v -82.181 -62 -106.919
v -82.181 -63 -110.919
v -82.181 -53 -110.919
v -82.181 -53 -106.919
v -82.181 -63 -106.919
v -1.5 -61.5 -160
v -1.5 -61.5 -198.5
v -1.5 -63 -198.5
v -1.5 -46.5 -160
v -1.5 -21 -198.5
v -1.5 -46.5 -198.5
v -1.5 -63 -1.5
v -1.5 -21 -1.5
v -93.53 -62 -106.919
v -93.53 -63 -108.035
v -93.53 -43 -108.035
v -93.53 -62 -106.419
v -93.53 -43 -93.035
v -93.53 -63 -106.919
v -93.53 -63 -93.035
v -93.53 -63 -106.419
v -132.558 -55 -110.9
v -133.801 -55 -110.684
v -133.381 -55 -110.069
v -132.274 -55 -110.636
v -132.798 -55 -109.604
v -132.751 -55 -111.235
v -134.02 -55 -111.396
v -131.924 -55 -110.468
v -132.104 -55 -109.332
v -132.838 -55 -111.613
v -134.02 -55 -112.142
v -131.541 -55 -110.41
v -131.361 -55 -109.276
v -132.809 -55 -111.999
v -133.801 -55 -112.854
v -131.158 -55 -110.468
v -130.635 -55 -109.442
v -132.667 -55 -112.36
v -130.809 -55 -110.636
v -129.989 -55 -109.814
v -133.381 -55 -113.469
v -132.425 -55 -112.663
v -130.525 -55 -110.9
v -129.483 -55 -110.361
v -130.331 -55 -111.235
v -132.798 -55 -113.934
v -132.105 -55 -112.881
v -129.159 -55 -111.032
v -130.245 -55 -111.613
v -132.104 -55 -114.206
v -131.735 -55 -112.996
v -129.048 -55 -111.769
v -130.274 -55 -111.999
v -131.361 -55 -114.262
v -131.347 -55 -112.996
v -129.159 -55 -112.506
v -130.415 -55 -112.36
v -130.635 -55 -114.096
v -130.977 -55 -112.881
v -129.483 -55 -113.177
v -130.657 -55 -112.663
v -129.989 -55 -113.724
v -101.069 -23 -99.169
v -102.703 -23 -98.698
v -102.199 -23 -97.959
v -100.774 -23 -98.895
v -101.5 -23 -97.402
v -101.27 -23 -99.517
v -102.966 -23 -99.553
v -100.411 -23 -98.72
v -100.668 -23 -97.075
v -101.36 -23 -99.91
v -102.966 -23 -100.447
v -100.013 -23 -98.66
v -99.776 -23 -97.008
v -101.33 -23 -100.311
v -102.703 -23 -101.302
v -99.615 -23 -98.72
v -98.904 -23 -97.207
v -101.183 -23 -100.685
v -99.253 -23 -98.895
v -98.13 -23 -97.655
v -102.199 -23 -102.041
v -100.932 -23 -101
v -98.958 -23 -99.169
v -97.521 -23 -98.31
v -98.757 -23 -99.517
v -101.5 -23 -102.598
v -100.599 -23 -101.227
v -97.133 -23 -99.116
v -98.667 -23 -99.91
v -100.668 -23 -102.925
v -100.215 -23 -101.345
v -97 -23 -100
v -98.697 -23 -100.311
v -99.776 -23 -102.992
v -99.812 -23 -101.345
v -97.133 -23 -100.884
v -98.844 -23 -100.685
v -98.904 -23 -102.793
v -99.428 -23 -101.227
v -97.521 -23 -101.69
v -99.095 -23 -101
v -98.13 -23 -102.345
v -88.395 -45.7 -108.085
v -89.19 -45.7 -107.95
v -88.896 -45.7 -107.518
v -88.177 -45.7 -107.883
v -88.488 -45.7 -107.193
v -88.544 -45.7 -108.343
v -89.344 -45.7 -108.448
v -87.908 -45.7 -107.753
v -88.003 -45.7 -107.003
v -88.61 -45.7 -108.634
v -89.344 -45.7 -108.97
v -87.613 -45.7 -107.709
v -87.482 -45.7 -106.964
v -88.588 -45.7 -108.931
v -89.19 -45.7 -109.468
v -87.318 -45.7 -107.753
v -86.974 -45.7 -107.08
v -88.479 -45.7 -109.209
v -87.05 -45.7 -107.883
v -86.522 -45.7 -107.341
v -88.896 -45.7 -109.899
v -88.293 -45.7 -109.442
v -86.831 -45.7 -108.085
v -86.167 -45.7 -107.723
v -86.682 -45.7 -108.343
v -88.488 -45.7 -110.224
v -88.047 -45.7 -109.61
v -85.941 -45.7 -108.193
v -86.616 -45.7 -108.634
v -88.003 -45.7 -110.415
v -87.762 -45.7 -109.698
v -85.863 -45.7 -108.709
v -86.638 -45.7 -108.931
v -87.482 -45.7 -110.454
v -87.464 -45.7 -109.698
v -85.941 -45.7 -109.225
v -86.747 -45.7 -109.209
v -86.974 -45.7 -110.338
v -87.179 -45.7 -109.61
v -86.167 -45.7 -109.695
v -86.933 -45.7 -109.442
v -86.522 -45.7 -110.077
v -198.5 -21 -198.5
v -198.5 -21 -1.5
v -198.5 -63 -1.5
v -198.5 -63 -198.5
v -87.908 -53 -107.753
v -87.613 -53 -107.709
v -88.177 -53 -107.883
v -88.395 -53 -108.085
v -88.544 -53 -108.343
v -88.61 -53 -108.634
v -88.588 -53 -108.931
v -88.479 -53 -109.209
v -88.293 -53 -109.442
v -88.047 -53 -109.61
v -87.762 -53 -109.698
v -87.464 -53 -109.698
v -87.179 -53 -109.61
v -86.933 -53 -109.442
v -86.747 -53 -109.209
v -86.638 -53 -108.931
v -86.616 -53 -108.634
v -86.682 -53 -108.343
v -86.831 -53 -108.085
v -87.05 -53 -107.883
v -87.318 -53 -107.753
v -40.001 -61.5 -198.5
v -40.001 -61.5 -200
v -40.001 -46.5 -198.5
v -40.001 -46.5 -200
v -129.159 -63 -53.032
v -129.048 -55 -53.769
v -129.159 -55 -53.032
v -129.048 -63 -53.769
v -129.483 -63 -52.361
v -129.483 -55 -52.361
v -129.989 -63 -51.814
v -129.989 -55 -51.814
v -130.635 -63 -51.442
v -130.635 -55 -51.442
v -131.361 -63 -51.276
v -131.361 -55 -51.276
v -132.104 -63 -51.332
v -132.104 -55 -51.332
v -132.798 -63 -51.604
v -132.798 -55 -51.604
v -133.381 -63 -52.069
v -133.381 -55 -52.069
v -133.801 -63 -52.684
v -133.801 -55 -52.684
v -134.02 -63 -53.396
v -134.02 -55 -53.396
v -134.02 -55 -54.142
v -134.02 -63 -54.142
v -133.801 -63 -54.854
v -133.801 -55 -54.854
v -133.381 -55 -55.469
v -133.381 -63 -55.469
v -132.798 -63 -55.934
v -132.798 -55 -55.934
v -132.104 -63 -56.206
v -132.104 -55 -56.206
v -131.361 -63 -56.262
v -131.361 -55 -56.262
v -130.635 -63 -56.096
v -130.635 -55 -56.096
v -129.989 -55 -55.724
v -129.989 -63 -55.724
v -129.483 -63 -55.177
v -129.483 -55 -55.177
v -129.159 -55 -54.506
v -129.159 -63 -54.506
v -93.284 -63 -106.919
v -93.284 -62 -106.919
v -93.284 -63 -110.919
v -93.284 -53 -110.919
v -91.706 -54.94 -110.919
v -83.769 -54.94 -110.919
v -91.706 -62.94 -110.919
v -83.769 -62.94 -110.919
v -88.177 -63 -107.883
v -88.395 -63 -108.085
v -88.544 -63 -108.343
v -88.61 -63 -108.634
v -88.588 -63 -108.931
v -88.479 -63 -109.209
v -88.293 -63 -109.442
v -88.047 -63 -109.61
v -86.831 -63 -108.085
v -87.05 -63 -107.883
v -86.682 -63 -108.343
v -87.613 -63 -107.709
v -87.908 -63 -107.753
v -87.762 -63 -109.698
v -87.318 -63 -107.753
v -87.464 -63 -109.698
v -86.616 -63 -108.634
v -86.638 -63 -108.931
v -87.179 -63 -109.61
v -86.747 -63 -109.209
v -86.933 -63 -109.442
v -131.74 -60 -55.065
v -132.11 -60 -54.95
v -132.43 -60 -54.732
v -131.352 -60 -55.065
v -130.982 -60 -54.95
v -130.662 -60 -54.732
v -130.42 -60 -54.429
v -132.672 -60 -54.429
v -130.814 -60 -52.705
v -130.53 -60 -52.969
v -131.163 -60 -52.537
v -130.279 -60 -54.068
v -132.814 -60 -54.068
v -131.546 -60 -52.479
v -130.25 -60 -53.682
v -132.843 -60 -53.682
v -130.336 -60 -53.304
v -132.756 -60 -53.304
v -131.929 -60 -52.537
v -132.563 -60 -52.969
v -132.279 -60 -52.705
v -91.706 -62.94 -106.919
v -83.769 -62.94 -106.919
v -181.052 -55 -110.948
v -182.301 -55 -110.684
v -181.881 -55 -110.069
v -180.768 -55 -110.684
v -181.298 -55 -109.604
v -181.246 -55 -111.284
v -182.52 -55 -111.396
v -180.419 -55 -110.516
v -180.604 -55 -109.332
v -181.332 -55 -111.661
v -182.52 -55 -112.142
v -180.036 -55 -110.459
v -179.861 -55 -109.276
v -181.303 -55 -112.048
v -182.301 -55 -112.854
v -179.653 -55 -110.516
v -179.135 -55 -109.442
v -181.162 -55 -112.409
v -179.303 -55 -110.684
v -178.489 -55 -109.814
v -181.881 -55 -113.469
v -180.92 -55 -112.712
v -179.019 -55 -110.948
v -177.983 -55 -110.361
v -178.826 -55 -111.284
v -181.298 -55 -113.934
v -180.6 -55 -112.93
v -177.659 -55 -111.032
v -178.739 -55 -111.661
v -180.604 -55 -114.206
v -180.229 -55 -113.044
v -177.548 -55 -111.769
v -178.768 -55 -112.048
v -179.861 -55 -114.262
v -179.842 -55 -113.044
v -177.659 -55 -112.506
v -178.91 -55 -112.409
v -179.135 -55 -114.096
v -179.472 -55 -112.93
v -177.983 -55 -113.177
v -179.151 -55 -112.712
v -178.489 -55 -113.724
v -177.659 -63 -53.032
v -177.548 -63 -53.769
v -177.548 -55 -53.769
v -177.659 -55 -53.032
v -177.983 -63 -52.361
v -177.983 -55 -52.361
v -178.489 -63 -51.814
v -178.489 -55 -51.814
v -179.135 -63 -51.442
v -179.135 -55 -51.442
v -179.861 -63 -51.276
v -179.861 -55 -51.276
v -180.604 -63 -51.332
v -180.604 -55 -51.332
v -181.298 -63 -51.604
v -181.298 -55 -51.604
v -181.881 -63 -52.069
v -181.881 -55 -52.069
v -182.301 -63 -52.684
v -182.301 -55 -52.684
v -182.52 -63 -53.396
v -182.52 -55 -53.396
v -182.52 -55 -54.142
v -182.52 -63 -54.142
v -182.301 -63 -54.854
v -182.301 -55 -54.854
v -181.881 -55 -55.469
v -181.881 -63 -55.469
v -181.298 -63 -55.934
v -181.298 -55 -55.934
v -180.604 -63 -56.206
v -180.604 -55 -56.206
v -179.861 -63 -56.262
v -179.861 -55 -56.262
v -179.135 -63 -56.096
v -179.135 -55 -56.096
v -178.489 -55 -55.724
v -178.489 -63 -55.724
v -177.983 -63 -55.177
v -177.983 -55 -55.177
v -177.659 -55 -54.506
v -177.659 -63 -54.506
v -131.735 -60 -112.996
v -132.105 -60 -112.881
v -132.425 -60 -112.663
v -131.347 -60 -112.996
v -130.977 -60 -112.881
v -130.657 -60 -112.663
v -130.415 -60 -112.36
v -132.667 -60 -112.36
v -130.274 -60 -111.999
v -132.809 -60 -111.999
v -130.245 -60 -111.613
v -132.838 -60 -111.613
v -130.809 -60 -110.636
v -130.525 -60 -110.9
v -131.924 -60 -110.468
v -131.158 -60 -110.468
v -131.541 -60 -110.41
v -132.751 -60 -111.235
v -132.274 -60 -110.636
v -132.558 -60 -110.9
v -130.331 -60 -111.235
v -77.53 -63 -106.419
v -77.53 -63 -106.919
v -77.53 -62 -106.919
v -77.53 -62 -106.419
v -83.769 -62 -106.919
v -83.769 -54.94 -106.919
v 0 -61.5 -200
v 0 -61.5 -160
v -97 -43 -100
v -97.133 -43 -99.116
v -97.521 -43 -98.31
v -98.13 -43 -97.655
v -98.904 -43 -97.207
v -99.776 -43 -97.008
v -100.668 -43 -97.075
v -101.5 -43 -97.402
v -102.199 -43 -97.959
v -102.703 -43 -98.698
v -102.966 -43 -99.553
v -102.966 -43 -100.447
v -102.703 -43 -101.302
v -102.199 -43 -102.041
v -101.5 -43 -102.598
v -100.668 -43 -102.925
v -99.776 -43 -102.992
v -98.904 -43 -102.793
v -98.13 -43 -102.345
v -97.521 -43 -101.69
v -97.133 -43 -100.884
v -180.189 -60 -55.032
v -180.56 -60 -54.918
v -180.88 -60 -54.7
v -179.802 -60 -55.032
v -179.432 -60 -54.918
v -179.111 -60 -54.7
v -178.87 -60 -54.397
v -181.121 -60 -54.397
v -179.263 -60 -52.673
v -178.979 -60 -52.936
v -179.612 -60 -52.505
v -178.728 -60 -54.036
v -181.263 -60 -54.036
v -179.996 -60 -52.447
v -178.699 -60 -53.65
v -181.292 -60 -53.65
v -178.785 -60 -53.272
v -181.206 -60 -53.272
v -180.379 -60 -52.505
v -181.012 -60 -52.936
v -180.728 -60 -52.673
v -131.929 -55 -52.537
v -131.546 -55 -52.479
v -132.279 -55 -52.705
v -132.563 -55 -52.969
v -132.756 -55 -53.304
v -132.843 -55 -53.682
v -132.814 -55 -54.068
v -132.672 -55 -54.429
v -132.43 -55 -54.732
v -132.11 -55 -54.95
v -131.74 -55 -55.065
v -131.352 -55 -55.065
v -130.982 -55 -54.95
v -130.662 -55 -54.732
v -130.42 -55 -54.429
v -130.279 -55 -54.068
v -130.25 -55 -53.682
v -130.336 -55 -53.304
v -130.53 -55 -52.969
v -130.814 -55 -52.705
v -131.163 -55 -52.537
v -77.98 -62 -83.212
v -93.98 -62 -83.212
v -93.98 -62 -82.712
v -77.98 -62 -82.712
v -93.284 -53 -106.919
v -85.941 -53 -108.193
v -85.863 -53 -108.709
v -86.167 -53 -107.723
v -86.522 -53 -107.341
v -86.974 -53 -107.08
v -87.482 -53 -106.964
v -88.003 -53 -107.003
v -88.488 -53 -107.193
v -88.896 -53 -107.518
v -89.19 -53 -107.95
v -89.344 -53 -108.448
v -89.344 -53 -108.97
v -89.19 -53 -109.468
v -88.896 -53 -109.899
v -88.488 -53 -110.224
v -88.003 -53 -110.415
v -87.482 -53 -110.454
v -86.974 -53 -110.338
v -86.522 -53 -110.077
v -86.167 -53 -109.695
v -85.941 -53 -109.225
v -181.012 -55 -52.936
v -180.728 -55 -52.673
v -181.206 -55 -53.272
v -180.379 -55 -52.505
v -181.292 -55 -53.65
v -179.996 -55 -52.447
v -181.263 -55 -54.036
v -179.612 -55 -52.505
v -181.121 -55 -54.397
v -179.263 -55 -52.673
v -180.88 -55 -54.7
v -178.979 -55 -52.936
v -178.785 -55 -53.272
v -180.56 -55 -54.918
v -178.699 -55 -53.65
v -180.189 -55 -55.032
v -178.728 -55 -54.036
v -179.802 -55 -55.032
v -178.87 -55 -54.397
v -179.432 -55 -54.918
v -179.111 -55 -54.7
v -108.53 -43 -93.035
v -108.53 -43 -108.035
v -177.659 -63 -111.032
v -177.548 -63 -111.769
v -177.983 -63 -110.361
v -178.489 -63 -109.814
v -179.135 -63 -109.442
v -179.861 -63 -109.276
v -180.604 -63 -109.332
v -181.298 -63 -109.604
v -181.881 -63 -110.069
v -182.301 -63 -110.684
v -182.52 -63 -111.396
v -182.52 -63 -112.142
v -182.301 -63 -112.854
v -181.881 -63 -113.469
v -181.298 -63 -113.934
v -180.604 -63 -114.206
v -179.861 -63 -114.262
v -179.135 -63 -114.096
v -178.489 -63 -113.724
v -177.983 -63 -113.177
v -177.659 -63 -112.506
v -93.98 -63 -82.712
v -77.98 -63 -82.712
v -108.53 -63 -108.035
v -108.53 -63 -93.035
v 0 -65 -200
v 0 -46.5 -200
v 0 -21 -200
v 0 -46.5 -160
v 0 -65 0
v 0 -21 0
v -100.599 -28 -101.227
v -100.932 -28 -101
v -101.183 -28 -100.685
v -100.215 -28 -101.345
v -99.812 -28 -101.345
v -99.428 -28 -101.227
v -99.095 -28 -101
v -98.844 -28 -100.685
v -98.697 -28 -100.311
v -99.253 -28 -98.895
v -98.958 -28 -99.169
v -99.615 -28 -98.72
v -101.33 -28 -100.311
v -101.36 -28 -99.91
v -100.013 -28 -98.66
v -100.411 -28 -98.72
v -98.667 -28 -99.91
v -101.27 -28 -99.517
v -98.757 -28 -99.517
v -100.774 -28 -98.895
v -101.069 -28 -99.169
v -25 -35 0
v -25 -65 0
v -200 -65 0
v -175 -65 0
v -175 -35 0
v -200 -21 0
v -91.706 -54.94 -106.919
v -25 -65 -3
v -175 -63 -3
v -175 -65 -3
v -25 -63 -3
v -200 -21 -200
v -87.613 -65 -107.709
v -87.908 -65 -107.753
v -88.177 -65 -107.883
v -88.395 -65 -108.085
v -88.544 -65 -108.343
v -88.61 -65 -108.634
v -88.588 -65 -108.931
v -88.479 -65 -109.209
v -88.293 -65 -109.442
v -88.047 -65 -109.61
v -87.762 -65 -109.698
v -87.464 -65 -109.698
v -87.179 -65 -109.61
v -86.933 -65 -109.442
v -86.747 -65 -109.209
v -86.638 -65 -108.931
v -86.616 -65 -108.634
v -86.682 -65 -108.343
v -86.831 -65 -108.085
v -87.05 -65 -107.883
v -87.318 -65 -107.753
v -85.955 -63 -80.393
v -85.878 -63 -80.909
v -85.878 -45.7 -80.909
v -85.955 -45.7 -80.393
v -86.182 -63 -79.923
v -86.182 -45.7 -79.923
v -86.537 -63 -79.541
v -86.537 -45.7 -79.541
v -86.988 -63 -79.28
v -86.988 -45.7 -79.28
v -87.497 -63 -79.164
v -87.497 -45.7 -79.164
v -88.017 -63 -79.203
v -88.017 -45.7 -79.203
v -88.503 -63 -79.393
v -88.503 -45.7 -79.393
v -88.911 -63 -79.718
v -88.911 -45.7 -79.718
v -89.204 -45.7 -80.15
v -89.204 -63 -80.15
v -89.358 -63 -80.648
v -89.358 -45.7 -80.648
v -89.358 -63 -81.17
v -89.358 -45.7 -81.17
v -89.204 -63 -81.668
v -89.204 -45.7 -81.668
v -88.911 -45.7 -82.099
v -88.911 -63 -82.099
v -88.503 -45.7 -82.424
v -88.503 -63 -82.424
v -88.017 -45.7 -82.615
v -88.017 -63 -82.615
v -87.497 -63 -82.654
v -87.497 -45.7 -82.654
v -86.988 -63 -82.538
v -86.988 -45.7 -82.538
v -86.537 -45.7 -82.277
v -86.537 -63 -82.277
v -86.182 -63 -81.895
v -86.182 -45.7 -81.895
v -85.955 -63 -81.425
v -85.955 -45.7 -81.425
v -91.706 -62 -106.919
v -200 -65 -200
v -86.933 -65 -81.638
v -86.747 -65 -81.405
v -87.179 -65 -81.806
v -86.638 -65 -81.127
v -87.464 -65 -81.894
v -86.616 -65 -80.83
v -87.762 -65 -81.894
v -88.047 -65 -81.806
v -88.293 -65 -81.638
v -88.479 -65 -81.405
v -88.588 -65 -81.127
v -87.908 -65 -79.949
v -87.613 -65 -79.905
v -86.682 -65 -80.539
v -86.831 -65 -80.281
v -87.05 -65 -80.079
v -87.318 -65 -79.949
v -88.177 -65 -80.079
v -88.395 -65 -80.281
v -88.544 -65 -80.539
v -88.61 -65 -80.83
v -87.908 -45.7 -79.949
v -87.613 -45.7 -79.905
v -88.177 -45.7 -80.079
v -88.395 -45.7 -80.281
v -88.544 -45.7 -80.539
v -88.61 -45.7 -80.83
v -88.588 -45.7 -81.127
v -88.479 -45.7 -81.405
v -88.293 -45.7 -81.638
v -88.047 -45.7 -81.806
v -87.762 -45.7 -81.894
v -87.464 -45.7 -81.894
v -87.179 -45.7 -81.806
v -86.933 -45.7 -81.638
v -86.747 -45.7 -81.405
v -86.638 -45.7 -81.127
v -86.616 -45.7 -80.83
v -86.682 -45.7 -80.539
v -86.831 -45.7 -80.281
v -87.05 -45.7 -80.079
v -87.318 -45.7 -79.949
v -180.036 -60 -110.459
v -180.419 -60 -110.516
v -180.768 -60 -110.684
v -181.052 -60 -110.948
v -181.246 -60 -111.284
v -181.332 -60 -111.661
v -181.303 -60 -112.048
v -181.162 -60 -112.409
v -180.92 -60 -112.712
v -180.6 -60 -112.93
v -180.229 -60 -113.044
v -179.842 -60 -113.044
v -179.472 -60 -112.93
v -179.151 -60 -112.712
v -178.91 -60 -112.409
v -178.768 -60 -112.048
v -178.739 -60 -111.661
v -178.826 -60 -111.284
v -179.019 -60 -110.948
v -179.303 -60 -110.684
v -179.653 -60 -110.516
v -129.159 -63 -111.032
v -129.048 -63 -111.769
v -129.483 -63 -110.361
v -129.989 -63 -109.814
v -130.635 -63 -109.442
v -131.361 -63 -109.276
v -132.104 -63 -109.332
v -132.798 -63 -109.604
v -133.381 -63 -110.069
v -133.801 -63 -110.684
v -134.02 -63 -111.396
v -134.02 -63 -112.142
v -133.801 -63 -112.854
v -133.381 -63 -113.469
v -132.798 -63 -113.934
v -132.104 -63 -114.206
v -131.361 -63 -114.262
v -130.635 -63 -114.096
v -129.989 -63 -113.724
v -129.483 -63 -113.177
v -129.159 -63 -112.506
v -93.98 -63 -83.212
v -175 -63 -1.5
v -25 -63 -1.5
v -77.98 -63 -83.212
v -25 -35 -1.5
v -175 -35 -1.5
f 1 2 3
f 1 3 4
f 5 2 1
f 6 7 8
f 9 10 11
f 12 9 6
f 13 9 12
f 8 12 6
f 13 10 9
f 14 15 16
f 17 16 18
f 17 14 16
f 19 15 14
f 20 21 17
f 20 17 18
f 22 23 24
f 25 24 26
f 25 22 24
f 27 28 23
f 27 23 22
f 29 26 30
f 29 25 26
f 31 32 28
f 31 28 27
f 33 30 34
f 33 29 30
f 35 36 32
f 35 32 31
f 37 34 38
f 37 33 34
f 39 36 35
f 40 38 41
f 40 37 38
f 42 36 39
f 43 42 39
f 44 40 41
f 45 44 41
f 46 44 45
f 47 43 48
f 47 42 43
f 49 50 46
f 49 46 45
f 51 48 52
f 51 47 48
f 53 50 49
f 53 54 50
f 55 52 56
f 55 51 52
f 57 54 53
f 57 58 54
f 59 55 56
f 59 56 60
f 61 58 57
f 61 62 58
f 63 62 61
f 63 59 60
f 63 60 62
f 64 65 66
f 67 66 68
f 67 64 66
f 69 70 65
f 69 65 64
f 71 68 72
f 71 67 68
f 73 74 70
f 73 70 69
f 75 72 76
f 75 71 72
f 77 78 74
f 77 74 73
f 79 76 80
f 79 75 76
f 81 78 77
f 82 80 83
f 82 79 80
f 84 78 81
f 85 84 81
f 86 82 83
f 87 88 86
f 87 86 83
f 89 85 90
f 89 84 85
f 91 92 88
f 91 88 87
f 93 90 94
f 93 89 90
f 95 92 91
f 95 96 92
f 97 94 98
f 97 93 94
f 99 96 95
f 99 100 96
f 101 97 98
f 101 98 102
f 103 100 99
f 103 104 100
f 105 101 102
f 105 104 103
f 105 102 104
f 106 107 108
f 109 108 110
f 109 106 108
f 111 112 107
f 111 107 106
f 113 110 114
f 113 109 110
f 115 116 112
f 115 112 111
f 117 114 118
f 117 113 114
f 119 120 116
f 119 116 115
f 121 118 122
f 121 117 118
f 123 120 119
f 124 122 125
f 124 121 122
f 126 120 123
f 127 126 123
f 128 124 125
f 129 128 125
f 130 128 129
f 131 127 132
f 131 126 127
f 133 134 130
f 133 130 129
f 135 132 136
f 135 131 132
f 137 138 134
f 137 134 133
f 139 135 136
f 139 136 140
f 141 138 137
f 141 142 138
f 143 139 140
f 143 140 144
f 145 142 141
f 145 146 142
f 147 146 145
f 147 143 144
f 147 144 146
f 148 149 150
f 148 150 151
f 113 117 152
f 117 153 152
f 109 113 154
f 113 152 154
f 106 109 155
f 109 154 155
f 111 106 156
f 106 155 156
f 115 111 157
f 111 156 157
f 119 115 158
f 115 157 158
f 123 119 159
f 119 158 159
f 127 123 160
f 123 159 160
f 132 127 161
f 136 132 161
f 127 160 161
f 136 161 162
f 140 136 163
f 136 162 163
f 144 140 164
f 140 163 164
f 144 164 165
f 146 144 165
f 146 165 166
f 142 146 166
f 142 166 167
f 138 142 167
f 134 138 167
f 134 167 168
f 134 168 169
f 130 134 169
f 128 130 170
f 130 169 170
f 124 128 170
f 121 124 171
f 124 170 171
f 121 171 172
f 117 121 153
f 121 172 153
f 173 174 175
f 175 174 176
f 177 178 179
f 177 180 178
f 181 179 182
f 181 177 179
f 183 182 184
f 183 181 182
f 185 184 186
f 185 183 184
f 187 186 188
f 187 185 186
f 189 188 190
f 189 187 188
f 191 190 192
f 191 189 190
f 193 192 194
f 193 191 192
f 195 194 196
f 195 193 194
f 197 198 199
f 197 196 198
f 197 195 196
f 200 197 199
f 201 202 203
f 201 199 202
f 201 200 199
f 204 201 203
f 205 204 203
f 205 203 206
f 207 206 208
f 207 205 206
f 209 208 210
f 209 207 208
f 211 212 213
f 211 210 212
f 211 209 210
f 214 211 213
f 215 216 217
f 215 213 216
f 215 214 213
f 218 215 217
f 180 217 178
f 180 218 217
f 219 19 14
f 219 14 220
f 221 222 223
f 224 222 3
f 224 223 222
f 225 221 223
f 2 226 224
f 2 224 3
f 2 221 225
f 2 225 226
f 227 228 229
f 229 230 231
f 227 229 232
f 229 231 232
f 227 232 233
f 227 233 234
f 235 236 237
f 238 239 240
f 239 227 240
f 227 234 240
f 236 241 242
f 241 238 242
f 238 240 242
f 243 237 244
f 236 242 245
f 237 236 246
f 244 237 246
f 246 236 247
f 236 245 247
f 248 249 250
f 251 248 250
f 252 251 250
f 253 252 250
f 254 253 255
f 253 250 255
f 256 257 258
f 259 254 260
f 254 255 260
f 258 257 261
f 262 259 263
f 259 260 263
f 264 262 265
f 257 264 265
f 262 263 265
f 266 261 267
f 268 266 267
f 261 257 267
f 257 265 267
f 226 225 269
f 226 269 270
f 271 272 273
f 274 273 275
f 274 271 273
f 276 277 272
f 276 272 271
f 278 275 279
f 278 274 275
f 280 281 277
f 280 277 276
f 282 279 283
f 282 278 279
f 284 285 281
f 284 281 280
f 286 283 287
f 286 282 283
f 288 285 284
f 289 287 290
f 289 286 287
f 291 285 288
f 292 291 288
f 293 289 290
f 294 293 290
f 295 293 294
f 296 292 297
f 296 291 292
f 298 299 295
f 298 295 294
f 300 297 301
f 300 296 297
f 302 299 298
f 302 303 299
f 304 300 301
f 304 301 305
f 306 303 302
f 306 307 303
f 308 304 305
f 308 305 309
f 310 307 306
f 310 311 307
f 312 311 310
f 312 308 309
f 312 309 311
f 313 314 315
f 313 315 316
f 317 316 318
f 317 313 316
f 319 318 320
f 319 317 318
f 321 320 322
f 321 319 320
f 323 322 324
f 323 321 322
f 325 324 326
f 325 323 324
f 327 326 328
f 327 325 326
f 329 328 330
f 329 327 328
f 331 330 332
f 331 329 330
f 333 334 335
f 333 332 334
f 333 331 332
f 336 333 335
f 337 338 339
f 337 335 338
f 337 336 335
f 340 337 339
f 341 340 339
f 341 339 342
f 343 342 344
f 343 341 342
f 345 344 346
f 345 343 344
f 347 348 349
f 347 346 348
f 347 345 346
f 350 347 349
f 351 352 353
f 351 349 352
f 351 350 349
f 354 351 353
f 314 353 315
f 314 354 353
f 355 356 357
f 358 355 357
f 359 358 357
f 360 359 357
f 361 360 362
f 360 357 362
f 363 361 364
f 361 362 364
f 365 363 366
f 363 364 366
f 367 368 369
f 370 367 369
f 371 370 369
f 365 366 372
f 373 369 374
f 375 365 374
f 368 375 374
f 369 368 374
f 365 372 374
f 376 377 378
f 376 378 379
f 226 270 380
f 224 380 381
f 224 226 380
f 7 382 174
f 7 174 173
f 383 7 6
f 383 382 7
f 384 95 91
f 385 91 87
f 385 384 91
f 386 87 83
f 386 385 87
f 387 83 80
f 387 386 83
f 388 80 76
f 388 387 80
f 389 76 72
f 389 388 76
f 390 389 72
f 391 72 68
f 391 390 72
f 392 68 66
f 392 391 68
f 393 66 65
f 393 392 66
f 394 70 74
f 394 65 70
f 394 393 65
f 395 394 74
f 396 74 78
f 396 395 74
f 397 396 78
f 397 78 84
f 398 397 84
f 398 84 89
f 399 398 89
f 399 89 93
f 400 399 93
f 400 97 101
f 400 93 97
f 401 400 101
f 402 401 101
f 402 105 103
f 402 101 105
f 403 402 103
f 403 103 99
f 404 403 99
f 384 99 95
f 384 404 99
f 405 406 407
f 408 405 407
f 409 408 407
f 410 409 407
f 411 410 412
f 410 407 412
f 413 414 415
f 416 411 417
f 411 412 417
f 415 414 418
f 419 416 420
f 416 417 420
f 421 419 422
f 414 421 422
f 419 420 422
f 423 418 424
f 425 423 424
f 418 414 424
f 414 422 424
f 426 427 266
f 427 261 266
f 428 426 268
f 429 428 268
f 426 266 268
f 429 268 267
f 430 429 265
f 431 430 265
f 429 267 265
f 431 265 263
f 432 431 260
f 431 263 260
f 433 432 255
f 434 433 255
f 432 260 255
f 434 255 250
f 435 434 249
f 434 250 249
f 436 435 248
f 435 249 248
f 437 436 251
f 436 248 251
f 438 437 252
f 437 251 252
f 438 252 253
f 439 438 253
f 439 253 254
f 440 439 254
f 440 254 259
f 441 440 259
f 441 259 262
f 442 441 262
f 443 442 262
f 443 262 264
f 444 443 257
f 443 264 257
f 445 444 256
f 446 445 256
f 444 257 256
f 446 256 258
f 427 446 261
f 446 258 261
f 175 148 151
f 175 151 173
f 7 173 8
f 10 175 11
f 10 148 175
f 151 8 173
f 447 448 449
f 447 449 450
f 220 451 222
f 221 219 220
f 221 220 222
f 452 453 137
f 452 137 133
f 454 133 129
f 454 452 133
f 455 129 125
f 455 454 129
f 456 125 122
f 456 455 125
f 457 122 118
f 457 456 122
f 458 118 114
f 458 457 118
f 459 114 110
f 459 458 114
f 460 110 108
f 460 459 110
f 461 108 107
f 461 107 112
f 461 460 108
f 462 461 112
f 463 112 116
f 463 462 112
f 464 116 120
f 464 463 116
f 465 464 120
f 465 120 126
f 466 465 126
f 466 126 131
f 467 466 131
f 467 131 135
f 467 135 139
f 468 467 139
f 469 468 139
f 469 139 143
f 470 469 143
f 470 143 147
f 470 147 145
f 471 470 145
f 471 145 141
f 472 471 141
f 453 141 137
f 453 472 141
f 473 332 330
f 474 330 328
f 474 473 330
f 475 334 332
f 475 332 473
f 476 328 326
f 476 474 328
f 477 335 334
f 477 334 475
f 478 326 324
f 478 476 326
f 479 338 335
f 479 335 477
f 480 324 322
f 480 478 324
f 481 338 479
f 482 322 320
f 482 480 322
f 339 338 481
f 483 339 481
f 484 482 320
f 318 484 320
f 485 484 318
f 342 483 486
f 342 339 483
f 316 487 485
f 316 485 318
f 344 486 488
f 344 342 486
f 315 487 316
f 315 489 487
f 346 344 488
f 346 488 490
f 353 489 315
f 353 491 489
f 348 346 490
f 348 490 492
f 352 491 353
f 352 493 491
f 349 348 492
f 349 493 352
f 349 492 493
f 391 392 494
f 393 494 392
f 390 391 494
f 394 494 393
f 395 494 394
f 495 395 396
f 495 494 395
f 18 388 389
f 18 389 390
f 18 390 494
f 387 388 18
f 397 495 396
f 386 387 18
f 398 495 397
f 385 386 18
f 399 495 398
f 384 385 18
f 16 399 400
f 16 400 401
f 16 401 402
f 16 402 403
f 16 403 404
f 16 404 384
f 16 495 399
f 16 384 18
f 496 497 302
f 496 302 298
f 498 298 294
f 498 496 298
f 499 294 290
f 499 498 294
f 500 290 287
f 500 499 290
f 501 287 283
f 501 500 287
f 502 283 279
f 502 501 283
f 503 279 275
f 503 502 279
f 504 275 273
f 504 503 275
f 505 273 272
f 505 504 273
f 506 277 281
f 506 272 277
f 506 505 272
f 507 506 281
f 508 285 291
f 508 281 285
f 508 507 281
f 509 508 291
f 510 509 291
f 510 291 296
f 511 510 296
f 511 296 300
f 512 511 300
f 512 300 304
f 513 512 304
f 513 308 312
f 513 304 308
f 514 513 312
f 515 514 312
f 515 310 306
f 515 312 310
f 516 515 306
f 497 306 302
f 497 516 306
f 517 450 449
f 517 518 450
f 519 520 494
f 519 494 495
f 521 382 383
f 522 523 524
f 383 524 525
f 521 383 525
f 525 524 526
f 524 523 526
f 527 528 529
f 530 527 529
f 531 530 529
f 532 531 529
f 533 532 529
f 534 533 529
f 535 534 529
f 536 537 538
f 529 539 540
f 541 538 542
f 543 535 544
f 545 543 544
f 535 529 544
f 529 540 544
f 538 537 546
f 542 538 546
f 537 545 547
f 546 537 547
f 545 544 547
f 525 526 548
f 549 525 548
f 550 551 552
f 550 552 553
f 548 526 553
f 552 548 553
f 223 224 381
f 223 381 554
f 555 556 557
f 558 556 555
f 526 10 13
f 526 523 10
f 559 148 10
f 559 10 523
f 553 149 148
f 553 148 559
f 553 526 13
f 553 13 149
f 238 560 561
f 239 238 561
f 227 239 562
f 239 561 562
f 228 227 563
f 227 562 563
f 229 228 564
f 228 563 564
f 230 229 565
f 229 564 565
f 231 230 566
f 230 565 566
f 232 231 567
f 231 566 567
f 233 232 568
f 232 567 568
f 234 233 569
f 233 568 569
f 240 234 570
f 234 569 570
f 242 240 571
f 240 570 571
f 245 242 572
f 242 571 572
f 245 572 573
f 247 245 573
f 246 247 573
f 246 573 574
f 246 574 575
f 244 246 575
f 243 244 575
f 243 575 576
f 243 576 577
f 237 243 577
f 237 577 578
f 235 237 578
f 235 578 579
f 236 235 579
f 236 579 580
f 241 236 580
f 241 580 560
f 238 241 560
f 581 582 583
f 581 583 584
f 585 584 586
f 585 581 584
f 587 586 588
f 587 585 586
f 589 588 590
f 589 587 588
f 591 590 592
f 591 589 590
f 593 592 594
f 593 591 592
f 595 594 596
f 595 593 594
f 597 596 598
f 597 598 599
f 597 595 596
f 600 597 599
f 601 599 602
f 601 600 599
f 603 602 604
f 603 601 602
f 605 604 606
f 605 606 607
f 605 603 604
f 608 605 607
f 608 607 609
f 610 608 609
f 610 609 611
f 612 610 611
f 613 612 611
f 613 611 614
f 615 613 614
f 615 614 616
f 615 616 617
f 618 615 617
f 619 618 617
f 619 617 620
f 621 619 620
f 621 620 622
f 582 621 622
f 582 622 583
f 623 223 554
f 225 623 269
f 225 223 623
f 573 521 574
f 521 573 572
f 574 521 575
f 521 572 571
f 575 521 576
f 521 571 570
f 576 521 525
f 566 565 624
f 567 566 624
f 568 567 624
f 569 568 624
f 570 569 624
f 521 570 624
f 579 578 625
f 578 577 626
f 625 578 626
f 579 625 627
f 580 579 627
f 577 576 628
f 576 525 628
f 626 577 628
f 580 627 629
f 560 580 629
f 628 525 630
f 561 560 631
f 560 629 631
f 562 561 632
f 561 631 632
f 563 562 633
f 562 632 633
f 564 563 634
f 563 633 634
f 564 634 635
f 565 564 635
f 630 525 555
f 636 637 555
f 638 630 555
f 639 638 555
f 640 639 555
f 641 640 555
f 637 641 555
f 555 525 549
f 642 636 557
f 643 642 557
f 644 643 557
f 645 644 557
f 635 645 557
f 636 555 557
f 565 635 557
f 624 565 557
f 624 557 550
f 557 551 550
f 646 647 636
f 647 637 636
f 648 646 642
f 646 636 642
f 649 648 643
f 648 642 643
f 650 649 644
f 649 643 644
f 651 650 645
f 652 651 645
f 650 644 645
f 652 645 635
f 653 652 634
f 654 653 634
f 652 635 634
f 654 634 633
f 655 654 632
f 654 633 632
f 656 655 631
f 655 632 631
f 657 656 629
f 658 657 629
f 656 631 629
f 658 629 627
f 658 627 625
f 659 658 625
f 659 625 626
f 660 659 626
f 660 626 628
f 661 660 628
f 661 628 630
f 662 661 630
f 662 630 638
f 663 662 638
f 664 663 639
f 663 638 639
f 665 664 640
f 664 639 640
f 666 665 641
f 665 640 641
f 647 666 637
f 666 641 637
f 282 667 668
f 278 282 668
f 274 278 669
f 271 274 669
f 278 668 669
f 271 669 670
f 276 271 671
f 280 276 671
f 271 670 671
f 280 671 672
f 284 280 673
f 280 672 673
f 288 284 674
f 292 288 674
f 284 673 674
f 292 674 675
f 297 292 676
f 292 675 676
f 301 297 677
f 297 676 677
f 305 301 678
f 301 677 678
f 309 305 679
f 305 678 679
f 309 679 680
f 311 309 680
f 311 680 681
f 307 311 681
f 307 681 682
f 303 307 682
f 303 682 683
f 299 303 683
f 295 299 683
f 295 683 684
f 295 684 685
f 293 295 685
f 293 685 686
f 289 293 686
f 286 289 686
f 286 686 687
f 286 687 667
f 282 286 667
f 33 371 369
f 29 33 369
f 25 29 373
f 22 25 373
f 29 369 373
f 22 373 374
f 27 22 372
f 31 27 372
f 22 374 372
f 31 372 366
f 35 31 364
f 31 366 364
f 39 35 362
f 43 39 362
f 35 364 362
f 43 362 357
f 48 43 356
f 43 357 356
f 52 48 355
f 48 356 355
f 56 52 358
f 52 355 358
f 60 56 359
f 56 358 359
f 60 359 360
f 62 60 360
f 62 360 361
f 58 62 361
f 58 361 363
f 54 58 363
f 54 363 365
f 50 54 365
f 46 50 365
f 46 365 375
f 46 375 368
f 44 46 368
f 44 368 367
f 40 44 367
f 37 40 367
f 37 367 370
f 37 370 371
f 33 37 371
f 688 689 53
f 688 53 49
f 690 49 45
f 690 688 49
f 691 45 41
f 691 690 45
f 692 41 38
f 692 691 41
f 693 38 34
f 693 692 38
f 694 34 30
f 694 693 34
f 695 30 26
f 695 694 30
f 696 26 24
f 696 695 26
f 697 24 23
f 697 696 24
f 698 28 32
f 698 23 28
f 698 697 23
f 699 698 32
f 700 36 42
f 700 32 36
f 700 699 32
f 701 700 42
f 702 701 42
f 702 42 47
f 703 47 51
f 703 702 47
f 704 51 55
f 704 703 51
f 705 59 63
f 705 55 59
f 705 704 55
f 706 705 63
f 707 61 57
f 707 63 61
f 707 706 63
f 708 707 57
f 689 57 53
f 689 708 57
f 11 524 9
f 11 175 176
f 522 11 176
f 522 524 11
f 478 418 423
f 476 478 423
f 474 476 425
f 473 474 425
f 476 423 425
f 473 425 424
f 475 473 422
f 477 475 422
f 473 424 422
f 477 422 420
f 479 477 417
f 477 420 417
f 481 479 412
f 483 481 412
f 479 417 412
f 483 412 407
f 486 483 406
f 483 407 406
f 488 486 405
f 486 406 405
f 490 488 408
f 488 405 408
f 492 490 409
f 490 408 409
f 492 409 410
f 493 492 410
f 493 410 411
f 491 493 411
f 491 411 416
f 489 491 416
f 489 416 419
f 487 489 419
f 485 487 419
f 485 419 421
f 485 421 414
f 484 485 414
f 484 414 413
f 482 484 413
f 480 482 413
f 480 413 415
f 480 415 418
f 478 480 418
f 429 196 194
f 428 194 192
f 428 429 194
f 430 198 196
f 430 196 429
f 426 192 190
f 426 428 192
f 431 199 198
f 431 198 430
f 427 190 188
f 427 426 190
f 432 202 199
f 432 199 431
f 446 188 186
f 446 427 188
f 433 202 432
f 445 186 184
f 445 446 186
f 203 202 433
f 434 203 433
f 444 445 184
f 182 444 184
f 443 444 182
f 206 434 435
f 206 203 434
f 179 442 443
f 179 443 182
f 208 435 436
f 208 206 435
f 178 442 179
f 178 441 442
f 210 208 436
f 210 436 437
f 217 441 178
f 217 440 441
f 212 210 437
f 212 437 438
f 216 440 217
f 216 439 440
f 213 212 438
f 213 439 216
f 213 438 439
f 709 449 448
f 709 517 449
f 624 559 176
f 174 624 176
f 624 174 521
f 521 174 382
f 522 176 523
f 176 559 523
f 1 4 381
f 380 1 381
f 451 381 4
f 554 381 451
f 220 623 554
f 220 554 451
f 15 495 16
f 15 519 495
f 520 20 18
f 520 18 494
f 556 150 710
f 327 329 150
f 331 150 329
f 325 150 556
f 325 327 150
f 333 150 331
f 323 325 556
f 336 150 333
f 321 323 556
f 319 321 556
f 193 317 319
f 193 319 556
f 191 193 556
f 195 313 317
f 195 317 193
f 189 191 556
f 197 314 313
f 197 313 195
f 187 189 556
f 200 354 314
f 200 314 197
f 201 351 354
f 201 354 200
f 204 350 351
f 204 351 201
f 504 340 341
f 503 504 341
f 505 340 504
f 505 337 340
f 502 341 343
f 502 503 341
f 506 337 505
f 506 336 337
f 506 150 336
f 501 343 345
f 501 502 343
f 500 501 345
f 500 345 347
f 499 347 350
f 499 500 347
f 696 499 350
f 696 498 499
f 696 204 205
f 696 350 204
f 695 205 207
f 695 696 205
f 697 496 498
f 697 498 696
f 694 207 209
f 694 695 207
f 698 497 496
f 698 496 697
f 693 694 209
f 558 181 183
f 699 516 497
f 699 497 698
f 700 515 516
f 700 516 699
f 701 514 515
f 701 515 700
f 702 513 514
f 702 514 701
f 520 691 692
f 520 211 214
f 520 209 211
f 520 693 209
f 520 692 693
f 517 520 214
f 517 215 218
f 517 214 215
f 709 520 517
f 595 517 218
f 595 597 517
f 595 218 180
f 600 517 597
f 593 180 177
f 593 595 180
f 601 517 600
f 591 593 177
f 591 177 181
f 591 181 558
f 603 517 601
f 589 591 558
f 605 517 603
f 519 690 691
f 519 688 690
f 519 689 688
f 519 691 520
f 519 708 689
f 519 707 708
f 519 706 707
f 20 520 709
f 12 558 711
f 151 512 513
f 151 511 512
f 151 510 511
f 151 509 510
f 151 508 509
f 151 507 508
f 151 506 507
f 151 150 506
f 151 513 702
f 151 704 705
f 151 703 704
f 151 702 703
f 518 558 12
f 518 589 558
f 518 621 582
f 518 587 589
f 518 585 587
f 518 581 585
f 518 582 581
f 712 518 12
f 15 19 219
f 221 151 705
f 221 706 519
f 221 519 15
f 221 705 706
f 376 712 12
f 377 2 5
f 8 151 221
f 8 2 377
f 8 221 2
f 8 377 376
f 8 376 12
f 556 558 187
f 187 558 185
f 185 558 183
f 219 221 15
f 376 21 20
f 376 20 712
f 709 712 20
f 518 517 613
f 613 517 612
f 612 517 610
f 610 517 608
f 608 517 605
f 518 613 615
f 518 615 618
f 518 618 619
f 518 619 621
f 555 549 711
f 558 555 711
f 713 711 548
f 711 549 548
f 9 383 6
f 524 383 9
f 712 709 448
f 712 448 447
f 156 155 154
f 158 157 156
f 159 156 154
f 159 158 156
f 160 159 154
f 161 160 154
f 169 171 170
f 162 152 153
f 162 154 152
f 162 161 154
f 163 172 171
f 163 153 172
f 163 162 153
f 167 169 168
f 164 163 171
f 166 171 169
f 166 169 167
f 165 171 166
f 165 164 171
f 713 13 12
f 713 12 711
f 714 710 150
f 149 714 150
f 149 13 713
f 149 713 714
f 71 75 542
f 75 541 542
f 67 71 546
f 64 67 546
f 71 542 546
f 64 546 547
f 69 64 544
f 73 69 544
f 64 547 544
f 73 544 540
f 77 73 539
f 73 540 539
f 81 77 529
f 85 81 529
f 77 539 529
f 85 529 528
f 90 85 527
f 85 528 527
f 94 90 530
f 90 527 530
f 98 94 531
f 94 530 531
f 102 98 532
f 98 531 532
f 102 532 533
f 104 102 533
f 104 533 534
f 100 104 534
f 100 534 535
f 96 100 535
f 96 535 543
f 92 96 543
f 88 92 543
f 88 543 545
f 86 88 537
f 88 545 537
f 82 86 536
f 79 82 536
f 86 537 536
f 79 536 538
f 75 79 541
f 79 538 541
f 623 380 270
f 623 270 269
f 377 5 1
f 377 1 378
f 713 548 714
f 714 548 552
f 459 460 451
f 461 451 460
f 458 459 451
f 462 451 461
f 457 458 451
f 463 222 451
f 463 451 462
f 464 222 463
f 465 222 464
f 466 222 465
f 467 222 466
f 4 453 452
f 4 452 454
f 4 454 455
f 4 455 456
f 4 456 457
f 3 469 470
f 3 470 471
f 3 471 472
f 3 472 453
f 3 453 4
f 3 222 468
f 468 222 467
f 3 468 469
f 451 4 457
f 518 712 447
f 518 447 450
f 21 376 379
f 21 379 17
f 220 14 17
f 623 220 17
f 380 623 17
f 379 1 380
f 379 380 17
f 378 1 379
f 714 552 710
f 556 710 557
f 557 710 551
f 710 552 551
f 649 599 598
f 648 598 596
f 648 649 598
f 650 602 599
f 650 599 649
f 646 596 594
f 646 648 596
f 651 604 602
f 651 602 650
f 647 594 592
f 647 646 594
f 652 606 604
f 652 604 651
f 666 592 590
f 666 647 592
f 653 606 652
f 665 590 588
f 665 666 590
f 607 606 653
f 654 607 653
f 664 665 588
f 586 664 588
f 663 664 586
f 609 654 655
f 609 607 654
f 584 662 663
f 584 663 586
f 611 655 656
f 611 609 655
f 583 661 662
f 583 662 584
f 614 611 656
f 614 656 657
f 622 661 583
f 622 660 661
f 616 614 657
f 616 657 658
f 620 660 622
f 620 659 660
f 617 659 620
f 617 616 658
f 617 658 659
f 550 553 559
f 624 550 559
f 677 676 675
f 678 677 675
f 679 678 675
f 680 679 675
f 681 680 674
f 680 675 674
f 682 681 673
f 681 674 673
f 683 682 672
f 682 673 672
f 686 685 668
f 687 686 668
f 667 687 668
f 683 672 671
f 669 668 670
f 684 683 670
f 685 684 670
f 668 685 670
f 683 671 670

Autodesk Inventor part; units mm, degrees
ref_plane "YZ Plane" through (0, 0, 0) normal (1, 0, 0) x (0, 1, 0)
ref_plane "XZ Plane" through (0, 0, 0) normal (0, 1, 0) x (-1, 0, 0)
ref_plane "XY Plane" through (0, 0, 0) normal (0, 0, 1) x (1, 0, 0)
sketch "Sketch1" plane through (0, 0, 0) normal (0, 1, 0) x (-1, 0, 0)
  line L0 (0, 0) -> (200, 0)
  line L1 (200, 0) -> (200, -200)
  line L2 (200, -200) -> (0, -200)
  line L3 (0, -200) -> (0, 0)
  line L4 (198, -198) -> (198, -2)
  line L5 (198, -2) -> (2, -2)
  line L6 (2, -2) -> (2, -198)
  line L7 (2, -198) -> (198, -198)
  dimension "d0" = 200
  dimension "d1" = 200
  dimension "d2" = 2
extrude "Extrusion1" add sketch "Sketch1" against normal blind 65 contours L0 L1 L2 L3 | L7 L6 L5 L4
sketch "Sketch2" plane through (0, 0, 0) normal (0, 1, 0) x (1, 0, 0)
  line L0 (-198.5, 198.5) -> (-1.5, 198.5)
  line L1 (-1.5, 198.5) -> (-1.5, 1.5)
  line L2 (-1.5, 1.5) -> (-198.5, 1.5)
  line L3 (-198.5, 1.5) -> (-198.5, 198.5)
  line L4 (-200, 200) -> (-200, 0) projected
  line L5 (0, 200) -> (-200, 200) projected
  line L6 (-109.0225, 121.8048) -> (-59.0225, 121.8048)
  line L7 (-59.0225, 121.8048) -> (-59.0225, 76.8048)
  line L8 (-59.0225, 76.8048) -> (-109.0225, 76.8048)
  line L9 (-109.0225, 76.8048) -> (-109.0225, 121.8048)
  circle A0 centre (-100, 100) radius 4
  point P0 (0, 0)
  dimension "d5" = 197
  dimension "d6" = 197
  dimension "d7" = 1.5
  dimension "d8" = 1.5
  dimension "d37" = 50
  dimension "d38" = 45
  dimension "d39" = 8
extrude "Extrusion2" cut sketch "Sketch2" against normal blind 63 contours L0 L1 L2 L3 | L6 L7 L8 L9 | A0
sketch "Sketch3" plane through (-200, 0, 0) normal (0, 0, 1) x (1, 0, 0)
  line L0 (25, -35) -> (25, -65)
  line L1 (25, -65) -> (175, -65)
  line L2 (175, -65) -> (175, -35)
  line L3 (175, -35) -> (25, -35)
  line L4 (200, 0) -> (200, -65) projected
  line L5 (42.8625, -63) -> (47.625, -63)
  line L6 (198.5, -63) -> (1.5, -63) projected
  line L7 (200, -65) -> (0, -65) projected
  dimension "d11" = 150
  dimension "d12" = 30
  dimension "d13" = 25
  dimension "d14" = 0
  dimension "d36" = 0
extrude "Extrusion3" cut sketch "Sketch3" against normal blind 3
sketch "Sketch4" plane through (0, 0, -200) normal (0, 0, -1) x (-1, 0, 0)
  line L0 (40.0009, -61.5) -> (40.0009, -46.5)
  line L1 (0.0009, -46.5) -> (40.0009, -46.5)
  line L2 (40.0009, -61.5) -> (0.0009, -61.5)
  line L3 (0.0009, -61.5) -> (0.0009, -46.5)
  line L4 (0.0009, -46.5) -> (40.0009, -46.5)
  line L5 (40.0009, -46.5) -> (40.0009, -61.5)
  line L6 (200, -65) -> (0, -65) projected
  point P0 (48.3834, -59.8808)
  point P1 (40.0009, -54)
  point P2 (0.0009, -54)
  dimension "d27" = 40
  dimension "d28" = 15
  dimension "d29" = 3.5
extrude "Extrusion4" cut sketch "Sketch4" against normal blind 3
sketch "Sketch5" plane through (0, 0, 0) normal (1, 0, 0) x (0, 0, -1)
  line L0 (200, -61.5) -> (160, -61.5)
  line L1 (160, -61.5) -> (160, -46.5)
  line L2 (160, -46.5) -> (200, -46.5)
  line L3 (200, -46.5) -> (200, -61.5)
  point P0 (0, 0)
  point P1 (160, -54)
  dimension "d30" = 40
  dimension "d33" = 15
extrude "Extrusion5" cut sketch "Sketch5" against normal blind 3
ref_plane "Work Plane4" through (-100, -62, -100) normal (0, 1, 0) x (1, 0, 0)
sketch "Sketch7" plane through (-100, -62, -100) normal (0, 1, 0) x (1, 0, 0)
  line L0 (31.2315, 20.7219) -> (-8.7685, 20.7219) projected
  line L1 (-8.7685, -19.2781) -> (31.2315, -19.2781) projected
  line L2 (-8.7685, 20.7219) -> (7.9375, 20.7219)
  line L3 (7.9375, 20.7219) -> (7.9375, -19.2781)
  line L4 (7.9375, -19.2781) -> (-8.7685, -19.2781)
  line L5 (-8.7685, -19.2781) -> (-8.7685, 20.7219)
  circle A0 centre (0, 0) radius 3
  point P0 (100, -100)
  dimension "d51" = 6
extrude "Extrusion7" add sketch "Sketch7" along normal blind 39 contours A0
ref_plane "Work Plane3" through (0, -35, 0) normal (0, 1, 0) x (1, 0, 0)
sketch "Sketch9" plane through (-100, -23, -100) normal (0, 1, 0) x (1, 0, 0)
  point P0 (100, -100)
  point P1 (-0.0134, 0.0104)
hole "Hole1" at (-100.0134, -23, -100.0104) direction (0, -1, 0) diameter 2.7 depth 5
sketch "Sketch16" plane through (0, -63, 0) normal (0, 1, 0) x (1, 0, 0)
  line L0 (-183.7981, 135.019) -> (-127.7981, 135.019)
  line L1 (-127.7981, 135.019) -> (-127.7981, 50.019)
  line L2 (-127.7981, 50.019) -> (-183.7981, 50.019)
  line L3 (-183.7981, 50.019) -> (-183.7981, 135.019)
  circle A0 centre (-131.5481, 111.769) radius 2.5
  circle A1 centre (-131.5481, 53.769) radius 2.5
  circle A2 centre (-180.0481, 111.769) radius 2.5
  circle A3 centre (-180.0481, 53.769) radius 2.5
  point P0 (0, 0)
  dimension "d106" = 85
  dimension "d107" = 56
  dimension "d108" = 5
  dimension "d109" = 5
  dimension "d110" = 23.25
  dimension "d111" = 58
  dimension "d112" = 3.75
  dimension "d113" = 5
  dimension "d114" = 5
  dimension "d115" = 58
  dimension "d116" = 23.25
  dimension "d117" = 48.5
  dimension "d118" = 3.75
  dimension "d119" = 3.75
  dimension "d120" = 48.5
extrude "Extrusion14" add sketch "Sketch16" along normal blind 8 contours A0 | A1 | A2 | A3
sketch "Sketch18" plane through (-180.0481, -55, -111.769) normal (0, 1, 0) x (1, 0, 0)
  point P0 (180.0481, -111.769)
  point P1 (0.0125, -0.0104)
hole "Hole4" at (-180.0357, -55, -111.7586) direction (0, -1, 0) diameter 2.6 depth 5
sketch "Sketch19" plane through (-131.5481, -55, -111.769) normal (0, 1, 0) x (1, 0, 0)
  point P0 (131.5481, -111.769)
  point P1 (0.007, -0.059)
hole "Hole5" at (-131.5412, -55, -111.7101) direction (0, -1, 0) diameter 2.6 depth 5
sketch "Sketch20" plane through (-180.0481, -55, -53.769) normal (0, 1, 0) x (1, 0, 0)
  point P0 (180.0481, -53.769)
  point P1 (0.0525, -0.0221)
hole "Hole6" at (-179.9956, -55, -53.747) direction (0, -1, 0) diameter 2.6 depth 5
sketch "Sketch21" plane through (-131.5481, -55, -53.769) normal (0, 1, 0) x (1, 0, 0)
  point P0 (131.5481, -53.769)
  point P1 (0.0019, 0.0101)
hole "Hole7" at (-131.5462, -55, -53.7792) direction (0, -1, 0) diameter 2.6 depth 5
sketch "Sketch23" plane through (-200, 0, 0) normal (0, 0, 1) x (1, 0, 0)
  line L0 (200, 0) -> (200, -65) projected
  line L1 (-0.0001, 0) -> (200, 0)
  line L2 (200, 0) -> (200, -21)
  line L3 (200, -21) -> (-0.0001, -21)
  line L4 (-0.0001, -21) -> (-0.0001, 0)
  dimension "d158" = 21
extrude "Extrusion15" cut sketch "Sketch23" against normal blind 3
sketch "Sketch24" plane through (0, -65, 0) normal (1, 0, 0) x (0, 0, -1)
  line L0 (2.6301, 65) -> (209.4801, 65)
  line L1 (209.4801, 65) -> (209.4801, 44)
  line L2 (209.4801, 44) -> (2.6301, 44)
  line L3 (2.6301, 44) -> (2.6301, 65)
  point P0 (0, 65)
  point P1 (-254.0504, -31.9889)
  dimension "d161" = 21
extrude "Extrusion16" cut sketch "Sketch24" against normal blind 1.5
sketch "Sketch25" plane through (0, -65, -200) normal (0, 0, -1) x (-1, 0, 0)
  line L0 (198.5, 65) -> (1.5, 65) projected
  line L1 (1.5, 65) -> (200, 65)
  line L2 (200, 65) -> (200, 44)
  line L3 (200, 44) -> (1.5, 44)
  line L4 (1.5, 44) -> (1.5, 65)
  point P0 (0, 65)
  dimension "d164" = 21
extrude "Extrusion17" cut sketch "Sketch25" against normal blind 1.5
sketch "Sketch29" plane through (0, -63, 0) normal (0, 1, 0) x (1, 0, 0)
  circle A0 centre (-87.6204, 99.9966) radius 2.4
  circle A1 centre (-100.007, 99.1404) radius 1.5875
  line L0 (-81.6277, 78.5588) -> (-81.6277, 83.3088)
  line L1 (-81.6277, 83.3088) -> (-93.6277, 83.3088)
  line L2 (-93.6277, 83.3088) -> (-93.6277, 78.5588)
  line L3 (-93.6277, 83.3088) -> (-81.6132, 83.3088)
  line L4 (-81.6132, 83.3088) -> (-81.6132, 106.3088)
  line L5 (-81.6132, 106.3088) -> (-93.6277, 106.3088)
  line L6 (-93.6277, 106.3088) -> (-93.6277, 83.3088)
  line L7 (-93.6277, 106.3088) -> (-81.6132, 106.3088)
  line L8 (-81.6132, 106.3088) -> (-81.6132, 111.0588)
  line L9 (-93.6277, 111.0588) -> (-93.6277, 106.3088)
  arc A2 (-87.2339, 79.8817) -> (-88.0214, 79.8817) centre (-87.6277, 80.9088) ccw
  arc A3 (-87.9871, 109.7433) -> (-87.2394, 109.7433) centre (-87.6132, 108.7088) ccw
  line L10 (-88.0214, 79.8817) -> (-88.0068, 79.8817)
  line L11 (-88.0068, 78.5588) -> (-88.0214, 78.5588)
  line L12 (-88.0214, 78.5588) -> (-88.0214, 79.8817)
  line L13 (-88.0214, 79.8817) -> (-88.0068, 79.8817)
  line L14 (-88.0068, 78.5588) -> (-88.0214, 78.5588)
  line L15 (-88.0214, 78.5588) -> (-88.0214, 79.8817)
  line L16 (-148.191, 49.2124) -> (-151.9502, 49.2124)
  line L17 (-87.2339, 79.8817) -> (-87.2339, 78.5588)
  line L18 (-88.0068, 109.7433) -> (-88.0068, 111.0662)
  line L19 (-88.0068, 109.7433) -> (-88.0068, 111.0662)
  line L20 (-87.613, 87.7328) -> (-87.613, 87.7254)
  line L21 (-87.2193, 111.0662) -> (-87.2193, 109.7433)
  line L22 (-87.9871, 109.7433) -> (-88.0068, 109.7433)
  line L23 (-87.9871, 109.7433) -> (-88.0068, 109.7433)
  line L24 (-87.2193, 109.7433) -> (-87.2394, 109.7433)
  line L25 (-87.2339, 111.0662) -> (-87.2193, 111.0662)
  circle A4 centre (-87.6132, 100.0088) radius 2.4
  circle A5 centre (-87.6132, 100.0088) radius 5.7525
  line L26 (-93.6277, 78.5588) -> (-88.0214, 78.5588)
  line L27 (-87.2339, 78.5588) -> (-81.6277, 78.5588)
  line L28 (-81.6132, 111.0588) -> (-87.2193, 111.0588)
  line L29 (-88.0068, 111.0588) -> (-93.6277, 111.0588)
  circle A6 centre (-87.6277, 80.9088) radius 1.75
  circle A7 centre (-87.6132, 108.7088) radius 1.75
  point P0 (0, 0)
  point P1 (-365.9025, -227.0891)
  point P2 (-350.612, -204.1468)
  point P3 (-350.6265, -227.1468)
  point P4 (-145.8741, 48.5842)
  dimension "d178" = 12.3867
  dimension "d186" = 12
  dimension "d187" = 4.75
  dimension "d188" = 23
  dimension "d189" = 4.75
  dimension "d190" = 2.2
  dimension "d191" = 2.2
  dimension "d192" = -27.8
  dimension "d193" = 4.8
  dimension "d196" = 3.5
  dimension "d197" = 3.5
sketch "Sketch30" plane through (0, -63, 0) normal (0, 1, 0) x (1, 0, 0)
  line L0 (-108.5304, 108.0352) -> (-93.5304, 108.0352)
  line L1 (-93.5304, 108.0352) -> (-93.5304, 93.0352)
  line L2 (-93.5304, 93.0352) -> (-108.5304, 93.0352)
  line L3 (-108.5304, 93.0352) -> (-108.5304, 108.0352)
  point P0 (0, 0)
  dimension "d171" = 15
  dimension "d172" = 15
extrude "Extrusion19" add sketch "Sketch30" along normal blind 20
sketch "Sketch31" plane through (-200, -65, -200) normal (-1, 0, 0) x (0, 0, 1)
  point P0 (200, 65)
sketch "Sketch32" plane through (-200, -65, -200) normal (-1, 0, 0) x (0, 0, 1)
  line L0 (1.5, 65) -> (0, 65) projected
  line L1 (0, 65) -> (197, 65)
  line L2 (197, 65) -> (197, 44)
  line L3 (197, 44) -> (0, 44)
  line L4 (0, 44) -> (0, 65)
  point P0 (200, 65)
extrude "Extrusion20" cut sketch "Sketch32" against normal blind 1.5
sketch "Sketch34" plane through (0, -63, 0) normal (0, 1, 0) x (1, 0, 0)
  line L0 (-93.5304, 106.9186) -> (-77.5304, 106.9186)
  line L1 (-77.5304, 106.9186) -> (-77.5304, 106.4186)
  line L2 (-77.5304, 106.4186) -> (-93.5304, 106.4186)
  line L3 (-93.5304, 106.4186) -> (-93.5304, 106.9186)
  line L4 (-93.9801, 83.2121) -> (-77.9801, 83.2121)
  line L5 (-77.9801, 83.2121) -> (-77.9801, 82.7121)
  line L6 (-77.9801, 82.7121) -> (-93.9801, 82.7121)
  line L7 (-93.9801, 82.7121) -> (-93.9801, 83.2121)
  point P0 (0, 0)
  dimension "d179" = 16
  dimension "d180" = 0.5
  dimension "d181" = 16
  dimension "d182" = 0.5
extrude "Extrusion21" add sketch "Sketch34" along normal blind 1
extrude "Extrusion22" add sketch "Sketch29" along normal blind 17.3 contours A6 L12 A2 L17 | L17 A2 L12 A6 | A7 L21 L24 A3 L22 L18 | L18 L22 A3 L24 L21 A7
sketch "Sketch35" plane through (-87.6132, -45.7, -108.7088) normal (0, 1, 0) x (1, 0, 0)
  circle A0 centre (0, 0) radius 1
  circle A1 centre (0, -27.804) radius 1
  point P0 (87.6132, -108.7088)
  dimension "d200" = 2
  dimension "d201" = 2
hole "Hole8" at (-87.6132, -45.7, -108.7088) at (-87.6132, -45.7, -80.9048) direction (0, -1, 0) diameter 2 depth 30
sketch "Sketch36" plane through (0, -63, 0) normal (0, 1, 0) x (1, 0, 0)
  line L0 (-77.5304, 106.9186) -> (-93.5304, 106.9186) projected
  line L1 (-93.2842, 110.9186) -> (-82.1811, 110.9186)
  line L2 (-82.1811, 110.9186) -> (-82.1811, 106.9186)
  line L3 (-82.1811, 106.9186) -> (-93.2842, 106.9186)
  line L4 (-93.2842, 106.9186) -> (-93.2842, 110.9186)
  point P0 (0, 0)
  dimension "d212" = 4
extrude "Extrusion23" add sketch "Sketch36" along normal blind 10
sketch "Sketch37" plane through (-82.1811, -63, -110.9186) normal (0, 0, -1) x (-1, 0, 0)
  line L0 (1.5875, 8.0595) -> (9.525, 8.0595)
  line L1 (9.525, 8.0595) -> (9.525, 0.0595)
  line L2 (9.525, 0.0595) -> (1.5875, 0.0595)
  line L3 (1.5875, 0.0595) -> (1.5875, 8.0595)
  point P0 (-82.1811, 63)
  dimension "d211" = 8
extrude "Extrusion24" cut sketch "Sketch37" against normal blind 4
properties part number "Box"
